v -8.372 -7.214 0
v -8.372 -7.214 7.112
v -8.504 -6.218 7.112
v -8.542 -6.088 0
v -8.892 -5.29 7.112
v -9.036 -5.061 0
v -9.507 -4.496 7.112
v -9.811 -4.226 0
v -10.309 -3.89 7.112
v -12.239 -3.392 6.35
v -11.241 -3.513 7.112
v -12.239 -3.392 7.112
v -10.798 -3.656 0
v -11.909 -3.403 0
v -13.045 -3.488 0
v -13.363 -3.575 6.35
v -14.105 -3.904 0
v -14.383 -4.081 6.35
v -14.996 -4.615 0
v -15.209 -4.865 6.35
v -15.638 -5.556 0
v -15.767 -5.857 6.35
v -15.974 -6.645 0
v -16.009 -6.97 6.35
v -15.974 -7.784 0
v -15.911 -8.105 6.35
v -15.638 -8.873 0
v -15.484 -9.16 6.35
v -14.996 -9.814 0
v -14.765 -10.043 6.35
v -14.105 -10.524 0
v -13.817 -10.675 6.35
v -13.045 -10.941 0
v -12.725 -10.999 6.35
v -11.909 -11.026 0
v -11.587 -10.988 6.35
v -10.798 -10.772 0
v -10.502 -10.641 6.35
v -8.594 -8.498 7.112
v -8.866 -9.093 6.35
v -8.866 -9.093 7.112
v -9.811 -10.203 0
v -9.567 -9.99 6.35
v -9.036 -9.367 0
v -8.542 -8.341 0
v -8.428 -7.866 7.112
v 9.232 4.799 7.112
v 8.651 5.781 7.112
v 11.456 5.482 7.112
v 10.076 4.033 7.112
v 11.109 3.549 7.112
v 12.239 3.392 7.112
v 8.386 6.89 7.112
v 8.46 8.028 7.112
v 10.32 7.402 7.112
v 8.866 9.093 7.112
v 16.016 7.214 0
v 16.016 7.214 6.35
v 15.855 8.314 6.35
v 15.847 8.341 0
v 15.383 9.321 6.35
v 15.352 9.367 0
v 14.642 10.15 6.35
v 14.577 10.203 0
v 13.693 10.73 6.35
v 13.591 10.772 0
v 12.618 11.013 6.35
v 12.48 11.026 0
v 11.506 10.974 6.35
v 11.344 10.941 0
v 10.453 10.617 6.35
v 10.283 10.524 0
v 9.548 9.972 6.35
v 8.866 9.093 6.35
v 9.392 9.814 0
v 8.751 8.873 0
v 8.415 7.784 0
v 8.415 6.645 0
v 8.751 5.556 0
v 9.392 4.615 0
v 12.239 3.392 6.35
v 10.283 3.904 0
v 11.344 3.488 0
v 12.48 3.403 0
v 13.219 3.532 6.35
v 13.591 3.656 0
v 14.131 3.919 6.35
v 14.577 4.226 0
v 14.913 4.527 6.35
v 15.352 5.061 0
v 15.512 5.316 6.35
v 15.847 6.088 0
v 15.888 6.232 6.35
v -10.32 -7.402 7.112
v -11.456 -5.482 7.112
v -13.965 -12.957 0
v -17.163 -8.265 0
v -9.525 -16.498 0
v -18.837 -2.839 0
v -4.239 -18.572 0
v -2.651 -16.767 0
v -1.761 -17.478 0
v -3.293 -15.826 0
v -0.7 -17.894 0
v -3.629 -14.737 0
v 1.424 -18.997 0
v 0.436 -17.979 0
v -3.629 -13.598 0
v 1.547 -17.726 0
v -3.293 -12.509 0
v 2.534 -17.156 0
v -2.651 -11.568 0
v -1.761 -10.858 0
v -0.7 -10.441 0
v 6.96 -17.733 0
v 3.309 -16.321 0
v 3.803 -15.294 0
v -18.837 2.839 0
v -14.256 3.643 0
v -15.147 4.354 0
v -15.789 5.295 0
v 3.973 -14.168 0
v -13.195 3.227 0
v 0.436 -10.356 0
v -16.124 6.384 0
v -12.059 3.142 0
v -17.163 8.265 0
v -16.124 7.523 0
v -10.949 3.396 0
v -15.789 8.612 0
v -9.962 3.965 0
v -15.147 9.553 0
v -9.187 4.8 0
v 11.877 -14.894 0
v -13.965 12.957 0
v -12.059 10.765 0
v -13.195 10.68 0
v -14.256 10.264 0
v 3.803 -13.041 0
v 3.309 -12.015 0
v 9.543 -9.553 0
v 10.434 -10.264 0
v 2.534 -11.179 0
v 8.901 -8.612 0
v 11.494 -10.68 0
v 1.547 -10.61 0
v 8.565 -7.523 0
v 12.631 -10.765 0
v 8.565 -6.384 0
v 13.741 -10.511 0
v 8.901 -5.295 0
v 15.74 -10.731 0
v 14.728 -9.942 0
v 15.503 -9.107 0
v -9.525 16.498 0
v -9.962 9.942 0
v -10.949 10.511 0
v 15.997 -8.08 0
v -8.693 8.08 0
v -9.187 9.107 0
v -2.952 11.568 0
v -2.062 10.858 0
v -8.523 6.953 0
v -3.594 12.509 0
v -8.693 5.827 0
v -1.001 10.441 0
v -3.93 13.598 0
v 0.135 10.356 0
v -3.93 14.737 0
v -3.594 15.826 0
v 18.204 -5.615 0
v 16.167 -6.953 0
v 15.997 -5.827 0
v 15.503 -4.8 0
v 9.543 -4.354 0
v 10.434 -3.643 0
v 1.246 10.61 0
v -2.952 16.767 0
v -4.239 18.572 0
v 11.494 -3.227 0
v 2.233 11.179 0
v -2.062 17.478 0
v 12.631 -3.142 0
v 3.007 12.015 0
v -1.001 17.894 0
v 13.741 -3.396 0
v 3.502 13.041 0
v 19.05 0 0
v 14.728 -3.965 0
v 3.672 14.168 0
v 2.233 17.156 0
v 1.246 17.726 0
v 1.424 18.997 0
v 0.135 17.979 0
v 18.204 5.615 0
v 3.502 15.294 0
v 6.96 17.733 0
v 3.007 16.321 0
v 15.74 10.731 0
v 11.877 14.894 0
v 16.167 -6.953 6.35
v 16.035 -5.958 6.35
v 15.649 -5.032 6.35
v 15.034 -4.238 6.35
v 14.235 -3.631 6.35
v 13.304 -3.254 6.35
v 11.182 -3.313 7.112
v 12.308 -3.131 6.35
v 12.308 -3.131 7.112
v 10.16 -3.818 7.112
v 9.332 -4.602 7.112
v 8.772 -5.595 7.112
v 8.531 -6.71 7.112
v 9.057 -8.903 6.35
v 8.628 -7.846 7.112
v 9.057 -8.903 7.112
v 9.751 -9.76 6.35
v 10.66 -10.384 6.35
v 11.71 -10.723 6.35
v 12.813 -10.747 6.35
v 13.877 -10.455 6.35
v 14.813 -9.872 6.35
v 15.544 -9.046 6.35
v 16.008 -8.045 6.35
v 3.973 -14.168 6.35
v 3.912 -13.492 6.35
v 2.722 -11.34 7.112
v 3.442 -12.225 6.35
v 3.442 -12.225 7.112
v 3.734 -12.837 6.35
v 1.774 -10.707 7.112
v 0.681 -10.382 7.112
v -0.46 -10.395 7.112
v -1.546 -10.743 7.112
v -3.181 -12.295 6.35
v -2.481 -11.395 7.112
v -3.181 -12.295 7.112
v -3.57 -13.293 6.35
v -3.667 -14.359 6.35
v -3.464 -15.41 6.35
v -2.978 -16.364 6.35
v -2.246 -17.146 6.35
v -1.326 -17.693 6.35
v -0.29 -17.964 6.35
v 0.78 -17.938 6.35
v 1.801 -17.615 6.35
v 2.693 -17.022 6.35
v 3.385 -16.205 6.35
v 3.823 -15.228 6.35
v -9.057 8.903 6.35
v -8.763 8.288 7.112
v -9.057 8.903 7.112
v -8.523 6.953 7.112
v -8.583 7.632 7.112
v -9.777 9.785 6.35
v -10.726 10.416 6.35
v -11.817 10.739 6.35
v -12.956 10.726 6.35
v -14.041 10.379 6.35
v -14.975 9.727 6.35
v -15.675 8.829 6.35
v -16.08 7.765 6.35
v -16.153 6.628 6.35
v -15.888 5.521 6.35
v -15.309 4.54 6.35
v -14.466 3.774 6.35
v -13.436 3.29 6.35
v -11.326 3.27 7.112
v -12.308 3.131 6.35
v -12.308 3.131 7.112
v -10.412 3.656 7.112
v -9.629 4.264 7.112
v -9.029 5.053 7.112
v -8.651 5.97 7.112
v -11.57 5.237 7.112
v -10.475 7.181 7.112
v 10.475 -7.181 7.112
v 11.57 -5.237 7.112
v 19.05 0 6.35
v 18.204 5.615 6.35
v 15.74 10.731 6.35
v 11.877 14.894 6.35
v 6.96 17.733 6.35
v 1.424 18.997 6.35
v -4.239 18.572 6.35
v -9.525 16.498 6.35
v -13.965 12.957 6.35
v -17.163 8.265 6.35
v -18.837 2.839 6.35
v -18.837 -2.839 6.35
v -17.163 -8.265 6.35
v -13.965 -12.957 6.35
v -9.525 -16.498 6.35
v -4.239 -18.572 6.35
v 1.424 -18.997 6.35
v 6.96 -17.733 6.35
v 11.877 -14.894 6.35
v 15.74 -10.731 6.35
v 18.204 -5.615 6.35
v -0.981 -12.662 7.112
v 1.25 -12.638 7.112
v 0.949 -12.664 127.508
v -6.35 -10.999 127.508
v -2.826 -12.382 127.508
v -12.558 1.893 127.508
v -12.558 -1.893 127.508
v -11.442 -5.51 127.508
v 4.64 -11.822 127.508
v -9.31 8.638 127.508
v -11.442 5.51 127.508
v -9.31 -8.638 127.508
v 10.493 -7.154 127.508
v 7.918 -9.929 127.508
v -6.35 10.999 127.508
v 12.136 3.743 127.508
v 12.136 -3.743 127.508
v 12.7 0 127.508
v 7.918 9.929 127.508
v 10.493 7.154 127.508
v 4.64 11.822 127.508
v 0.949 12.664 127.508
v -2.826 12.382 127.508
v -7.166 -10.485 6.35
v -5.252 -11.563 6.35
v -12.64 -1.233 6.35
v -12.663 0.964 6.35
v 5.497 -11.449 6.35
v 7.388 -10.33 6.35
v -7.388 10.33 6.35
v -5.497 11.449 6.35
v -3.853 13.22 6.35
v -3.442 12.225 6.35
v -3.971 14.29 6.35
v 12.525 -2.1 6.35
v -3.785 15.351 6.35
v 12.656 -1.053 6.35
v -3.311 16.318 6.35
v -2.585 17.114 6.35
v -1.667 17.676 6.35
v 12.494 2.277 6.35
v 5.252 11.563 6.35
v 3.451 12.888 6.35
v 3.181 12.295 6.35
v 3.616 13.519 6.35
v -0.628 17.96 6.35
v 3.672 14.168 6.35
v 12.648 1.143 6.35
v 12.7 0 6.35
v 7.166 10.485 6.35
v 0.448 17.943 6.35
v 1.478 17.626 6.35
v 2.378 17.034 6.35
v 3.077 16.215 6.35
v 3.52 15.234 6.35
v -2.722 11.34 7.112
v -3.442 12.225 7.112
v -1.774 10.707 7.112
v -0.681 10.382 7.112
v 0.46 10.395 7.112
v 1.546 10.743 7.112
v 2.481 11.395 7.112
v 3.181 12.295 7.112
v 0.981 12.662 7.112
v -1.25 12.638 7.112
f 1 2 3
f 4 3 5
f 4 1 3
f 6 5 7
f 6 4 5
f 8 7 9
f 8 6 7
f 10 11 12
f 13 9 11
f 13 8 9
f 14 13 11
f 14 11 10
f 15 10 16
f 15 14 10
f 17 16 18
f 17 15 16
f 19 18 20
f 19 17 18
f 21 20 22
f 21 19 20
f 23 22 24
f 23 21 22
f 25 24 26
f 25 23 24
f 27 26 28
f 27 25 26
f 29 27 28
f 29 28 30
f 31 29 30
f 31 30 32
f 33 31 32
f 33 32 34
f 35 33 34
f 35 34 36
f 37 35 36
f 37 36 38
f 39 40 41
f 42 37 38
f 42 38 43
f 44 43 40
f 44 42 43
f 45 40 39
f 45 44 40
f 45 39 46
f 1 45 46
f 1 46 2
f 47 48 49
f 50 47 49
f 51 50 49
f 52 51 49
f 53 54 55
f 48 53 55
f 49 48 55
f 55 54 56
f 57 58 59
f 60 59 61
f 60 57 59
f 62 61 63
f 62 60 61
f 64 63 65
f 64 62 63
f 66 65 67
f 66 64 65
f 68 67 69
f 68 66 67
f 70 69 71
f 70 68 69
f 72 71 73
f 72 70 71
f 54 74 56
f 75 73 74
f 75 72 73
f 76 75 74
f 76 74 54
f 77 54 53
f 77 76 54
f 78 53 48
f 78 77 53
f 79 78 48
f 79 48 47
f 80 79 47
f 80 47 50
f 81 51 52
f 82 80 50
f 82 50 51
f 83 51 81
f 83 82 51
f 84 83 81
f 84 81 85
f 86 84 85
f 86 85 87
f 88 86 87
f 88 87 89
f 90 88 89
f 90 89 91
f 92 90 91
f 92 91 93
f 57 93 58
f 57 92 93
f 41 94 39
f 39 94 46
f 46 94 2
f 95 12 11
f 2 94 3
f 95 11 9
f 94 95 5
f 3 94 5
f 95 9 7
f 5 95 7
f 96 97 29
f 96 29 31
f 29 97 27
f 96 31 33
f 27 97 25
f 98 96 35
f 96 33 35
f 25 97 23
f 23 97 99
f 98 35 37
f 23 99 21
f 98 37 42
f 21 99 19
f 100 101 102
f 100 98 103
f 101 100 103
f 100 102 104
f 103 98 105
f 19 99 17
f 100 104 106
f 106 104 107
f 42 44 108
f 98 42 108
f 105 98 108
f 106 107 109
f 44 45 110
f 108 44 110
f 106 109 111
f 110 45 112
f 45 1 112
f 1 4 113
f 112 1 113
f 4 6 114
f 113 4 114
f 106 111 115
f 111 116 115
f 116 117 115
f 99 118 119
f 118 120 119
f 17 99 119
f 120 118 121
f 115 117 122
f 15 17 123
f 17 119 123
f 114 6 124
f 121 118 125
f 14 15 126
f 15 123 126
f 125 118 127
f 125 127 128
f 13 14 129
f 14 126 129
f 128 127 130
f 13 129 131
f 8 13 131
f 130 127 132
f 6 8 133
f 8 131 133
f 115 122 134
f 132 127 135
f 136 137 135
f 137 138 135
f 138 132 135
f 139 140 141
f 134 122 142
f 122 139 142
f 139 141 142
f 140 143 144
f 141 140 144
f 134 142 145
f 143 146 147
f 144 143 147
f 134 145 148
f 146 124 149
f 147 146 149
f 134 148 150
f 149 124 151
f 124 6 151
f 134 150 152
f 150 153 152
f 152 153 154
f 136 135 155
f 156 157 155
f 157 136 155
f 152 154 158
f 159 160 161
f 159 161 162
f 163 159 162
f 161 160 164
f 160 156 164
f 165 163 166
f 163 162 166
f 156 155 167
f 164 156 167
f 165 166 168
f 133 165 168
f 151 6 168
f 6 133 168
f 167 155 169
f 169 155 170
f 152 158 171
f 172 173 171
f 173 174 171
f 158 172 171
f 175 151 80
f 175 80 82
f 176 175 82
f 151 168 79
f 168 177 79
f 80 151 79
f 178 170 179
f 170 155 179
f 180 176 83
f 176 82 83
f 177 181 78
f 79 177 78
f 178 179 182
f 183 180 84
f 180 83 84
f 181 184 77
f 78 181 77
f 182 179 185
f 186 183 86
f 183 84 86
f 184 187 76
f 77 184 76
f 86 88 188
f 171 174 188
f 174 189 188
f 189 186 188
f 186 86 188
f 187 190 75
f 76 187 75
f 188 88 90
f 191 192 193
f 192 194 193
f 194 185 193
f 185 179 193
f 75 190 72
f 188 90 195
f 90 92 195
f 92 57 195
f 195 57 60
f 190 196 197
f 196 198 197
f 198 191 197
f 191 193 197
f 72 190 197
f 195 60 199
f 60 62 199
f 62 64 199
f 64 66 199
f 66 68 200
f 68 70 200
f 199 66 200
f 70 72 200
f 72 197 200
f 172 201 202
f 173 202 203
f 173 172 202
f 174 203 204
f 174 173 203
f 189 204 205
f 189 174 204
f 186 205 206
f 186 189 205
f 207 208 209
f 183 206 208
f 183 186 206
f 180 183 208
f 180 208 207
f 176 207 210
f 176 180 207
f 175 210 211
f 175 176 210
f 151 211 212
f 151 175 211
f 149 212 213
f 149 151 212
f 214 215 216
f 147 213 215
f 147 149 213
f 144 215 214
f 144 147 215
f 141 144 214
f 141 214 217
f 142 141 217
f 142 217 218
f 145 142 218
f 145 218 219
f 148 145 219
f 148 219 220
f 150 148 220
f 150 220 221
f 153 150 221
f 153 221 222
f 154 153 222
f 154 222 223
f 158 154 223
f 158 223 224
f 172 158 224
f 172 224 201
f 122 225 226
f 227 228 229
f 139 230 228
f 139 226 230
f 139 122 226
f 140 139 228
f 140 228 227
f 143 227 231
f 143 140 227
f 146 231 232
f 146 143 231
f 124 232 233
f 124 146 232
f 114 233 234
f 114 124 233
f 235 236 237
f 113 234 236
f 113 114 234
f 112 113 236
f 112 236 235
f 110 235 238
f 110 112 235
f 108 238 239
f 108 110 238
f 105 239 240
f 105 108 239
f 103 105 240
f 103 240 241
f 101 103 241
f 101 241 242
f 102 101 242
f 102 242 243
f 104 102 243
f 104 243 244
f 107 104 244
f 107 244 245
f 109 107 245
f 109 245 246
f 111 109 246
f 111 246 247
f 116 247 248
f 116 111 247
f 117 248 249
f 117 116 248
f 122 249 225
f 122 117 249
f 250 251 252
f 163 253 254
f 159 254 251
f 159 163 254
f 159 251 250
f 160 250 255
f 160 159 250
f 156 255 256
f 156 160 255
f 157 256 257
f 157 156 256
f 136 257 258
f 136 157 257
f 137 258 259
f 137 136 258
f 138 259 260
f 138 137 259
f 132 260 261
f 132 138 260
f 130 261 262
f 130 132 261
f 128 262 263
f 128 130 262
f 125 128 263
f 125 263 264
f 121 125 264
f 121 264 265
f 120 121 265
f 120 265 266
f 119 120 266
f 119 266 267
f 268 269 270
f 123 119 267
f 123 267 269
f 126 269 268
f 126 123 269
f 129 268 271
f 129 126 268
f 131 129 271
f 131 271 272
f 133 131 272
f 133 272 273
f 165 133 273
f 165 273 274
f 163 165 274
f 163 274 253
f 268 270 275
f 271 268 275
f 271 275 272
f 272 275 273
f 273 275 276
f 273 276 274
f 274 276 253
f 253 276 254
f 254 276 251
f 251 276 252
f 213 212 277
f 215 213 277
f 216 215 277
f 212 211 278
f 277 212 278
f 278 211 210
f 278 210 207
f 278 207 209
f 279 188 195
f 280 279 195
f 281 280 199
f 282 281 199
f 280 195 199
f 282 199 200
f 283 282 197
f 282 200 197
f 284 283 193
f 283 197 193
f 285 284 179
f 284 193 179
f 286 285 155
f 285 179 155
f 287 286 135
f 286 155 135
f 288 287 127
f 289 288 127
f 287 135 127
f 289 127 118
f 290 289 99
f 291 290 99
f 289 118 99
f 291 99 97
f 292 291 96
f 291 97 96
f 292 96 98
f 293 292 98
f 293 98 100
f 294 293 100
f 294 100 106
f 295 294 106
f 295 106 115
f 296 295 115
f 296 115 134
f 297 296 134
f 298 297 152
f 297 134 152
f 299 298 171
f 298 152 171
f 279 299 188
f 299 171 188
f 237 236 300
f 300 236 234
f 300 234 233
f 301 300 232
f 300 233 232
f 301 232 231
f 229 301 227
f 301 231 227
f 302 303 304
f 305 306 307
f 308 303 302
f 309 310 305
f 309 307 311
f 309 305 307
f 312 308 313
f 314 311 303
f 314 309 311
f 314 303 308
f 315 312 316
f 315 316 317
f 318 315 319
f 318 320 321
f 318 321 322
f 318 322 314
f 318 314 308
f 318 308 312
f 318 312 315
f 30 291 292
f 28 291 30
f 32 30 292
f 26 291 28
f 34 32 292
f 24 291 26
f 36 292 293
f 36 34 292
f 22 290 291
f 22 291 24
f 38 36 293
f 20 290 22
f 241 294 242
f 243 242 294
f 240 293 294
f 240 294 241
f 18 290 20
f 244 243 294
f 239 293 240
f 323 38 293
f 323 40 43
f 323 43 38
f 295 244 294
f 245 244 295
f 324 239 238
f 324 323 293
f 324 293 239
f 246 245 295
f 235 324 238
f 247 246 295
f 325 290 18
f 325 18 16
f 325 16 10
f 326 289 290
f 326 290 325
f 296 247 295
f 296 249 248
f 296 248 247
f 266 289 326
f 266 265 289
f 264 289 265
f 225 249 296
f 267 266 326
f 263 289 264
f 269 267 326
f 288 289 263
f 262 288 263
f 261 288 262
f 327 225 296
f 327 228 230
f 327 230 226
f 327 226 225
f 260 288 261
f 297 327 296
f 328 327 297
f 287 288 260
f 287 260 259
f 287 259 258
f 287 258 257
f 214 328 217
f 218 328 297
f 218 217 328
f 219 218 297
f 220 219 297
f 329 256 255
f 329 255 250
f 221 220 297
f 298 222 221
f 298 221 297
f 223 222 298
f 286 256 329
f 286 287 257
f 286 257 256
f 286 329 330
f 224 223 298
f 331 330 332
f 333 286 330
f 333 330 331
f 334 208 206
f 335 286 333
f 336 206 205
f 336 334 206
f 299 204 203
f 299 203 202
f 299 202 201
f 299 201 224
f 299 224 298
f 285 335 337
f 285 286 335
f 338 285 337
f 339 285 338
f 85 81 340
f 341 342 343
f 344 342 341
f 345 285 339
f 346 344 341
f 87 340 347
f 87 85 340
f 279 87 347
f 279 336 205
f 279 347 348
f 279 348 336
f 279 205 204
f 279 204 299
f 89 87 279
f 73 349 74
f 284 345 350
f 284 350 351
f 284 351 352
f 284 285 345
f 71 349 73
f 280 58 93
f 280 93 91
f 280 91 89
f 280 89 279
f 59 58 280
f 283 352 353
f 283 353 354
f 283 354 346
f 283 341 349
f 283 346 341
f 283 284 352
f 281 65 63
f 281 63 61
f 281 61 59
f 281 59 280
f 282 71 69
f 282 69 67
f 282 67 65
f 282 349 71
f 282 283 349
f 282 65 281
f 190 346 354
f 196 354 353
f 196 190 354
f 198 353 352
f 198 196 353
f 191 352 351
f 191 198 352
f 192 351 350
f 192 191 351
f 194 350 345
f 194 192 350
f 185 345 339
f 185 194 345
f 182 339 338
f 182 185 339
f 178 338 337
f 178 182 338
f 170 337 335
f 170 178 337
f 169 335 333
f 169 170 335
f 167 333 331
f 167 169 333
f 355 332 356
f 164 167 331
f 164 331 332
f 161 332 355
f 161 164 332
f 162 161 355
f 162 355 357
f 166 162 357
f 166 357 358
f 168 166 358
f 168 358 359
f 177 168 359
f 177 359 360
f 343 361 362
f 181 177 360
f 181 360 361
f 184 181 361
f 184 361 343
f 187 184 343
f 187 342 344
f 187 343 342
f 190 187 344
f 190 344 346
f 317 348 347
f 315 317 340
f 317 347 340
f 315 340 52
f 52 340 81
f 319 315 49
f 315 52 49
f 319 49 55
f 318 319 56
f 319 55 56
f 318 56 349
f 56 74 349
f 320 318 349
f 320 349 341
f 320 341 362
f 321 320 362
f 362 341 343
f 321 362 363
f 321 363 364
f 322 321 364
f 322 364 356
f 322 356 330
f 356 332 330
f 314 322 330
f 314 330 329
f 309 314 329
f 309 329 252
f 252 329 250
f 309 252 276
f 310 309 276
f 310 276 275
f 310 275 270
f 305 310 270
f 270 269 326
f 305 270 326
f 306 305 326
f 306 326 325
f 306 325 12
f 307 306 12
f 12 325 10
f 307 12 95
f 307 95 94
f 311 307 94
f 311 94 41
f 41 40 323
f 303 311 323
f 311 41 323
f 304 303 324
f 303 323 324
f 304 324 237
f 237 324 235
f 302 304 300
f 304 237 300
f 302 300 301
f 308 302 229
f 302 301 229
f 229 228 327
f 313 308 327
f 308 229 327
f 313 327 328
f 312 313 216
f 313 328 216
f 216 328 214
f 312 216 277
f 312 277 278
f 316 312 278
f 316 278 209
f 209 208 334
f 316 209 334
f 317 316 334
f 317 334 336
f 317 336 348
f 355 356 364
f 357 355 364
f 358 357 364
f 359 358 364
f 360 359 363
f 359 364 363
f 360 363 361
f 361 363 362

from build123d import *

# Parameters (mm, degrees)
F0_R     = 12.7
F1_DEPTH = 127.508
F2_R     = 19.05
F3_DEPTH = 6.35
F4_R     = 3.822156
F5_DEPTH = 7.112


with BuildPart() as f1:
    # F0 (on Top) → F1 (new body)
    with BuildSketch(Plane.XY):
        Circle(F0_R)
    extrude(amount=F1_DEPTH)

    # F2 (on Top) → F3 (join)
    with BuildSketch(Plane.XY):
        Circle(F2_R)
    extrude(amount=F3_DEPTH)

    # F4 (on Top) → F5 (cut)
    with BuildSketch(Plane.XY):
        with Locations((12.194332, 7.214257)):
            Circle(F4_R)
        with Locations((-0.150564, 14.16773)):
            Circle(F4_R)
        with Locations((-12.344896, 6.953473)):
            Circle(F4_R)
        with Locations((-12.194332, -7.214257)):
            Circle(F4_R)
        with Locations((0.150564, -14.16773)):
            Circle(F4_R)
        with Locations((12.344896, -6.953473)):
            Circle(F4_R)
    extrude(amount=F5_DEPTH, mode=Mode.SUBTRACT)


solid = f1.part
